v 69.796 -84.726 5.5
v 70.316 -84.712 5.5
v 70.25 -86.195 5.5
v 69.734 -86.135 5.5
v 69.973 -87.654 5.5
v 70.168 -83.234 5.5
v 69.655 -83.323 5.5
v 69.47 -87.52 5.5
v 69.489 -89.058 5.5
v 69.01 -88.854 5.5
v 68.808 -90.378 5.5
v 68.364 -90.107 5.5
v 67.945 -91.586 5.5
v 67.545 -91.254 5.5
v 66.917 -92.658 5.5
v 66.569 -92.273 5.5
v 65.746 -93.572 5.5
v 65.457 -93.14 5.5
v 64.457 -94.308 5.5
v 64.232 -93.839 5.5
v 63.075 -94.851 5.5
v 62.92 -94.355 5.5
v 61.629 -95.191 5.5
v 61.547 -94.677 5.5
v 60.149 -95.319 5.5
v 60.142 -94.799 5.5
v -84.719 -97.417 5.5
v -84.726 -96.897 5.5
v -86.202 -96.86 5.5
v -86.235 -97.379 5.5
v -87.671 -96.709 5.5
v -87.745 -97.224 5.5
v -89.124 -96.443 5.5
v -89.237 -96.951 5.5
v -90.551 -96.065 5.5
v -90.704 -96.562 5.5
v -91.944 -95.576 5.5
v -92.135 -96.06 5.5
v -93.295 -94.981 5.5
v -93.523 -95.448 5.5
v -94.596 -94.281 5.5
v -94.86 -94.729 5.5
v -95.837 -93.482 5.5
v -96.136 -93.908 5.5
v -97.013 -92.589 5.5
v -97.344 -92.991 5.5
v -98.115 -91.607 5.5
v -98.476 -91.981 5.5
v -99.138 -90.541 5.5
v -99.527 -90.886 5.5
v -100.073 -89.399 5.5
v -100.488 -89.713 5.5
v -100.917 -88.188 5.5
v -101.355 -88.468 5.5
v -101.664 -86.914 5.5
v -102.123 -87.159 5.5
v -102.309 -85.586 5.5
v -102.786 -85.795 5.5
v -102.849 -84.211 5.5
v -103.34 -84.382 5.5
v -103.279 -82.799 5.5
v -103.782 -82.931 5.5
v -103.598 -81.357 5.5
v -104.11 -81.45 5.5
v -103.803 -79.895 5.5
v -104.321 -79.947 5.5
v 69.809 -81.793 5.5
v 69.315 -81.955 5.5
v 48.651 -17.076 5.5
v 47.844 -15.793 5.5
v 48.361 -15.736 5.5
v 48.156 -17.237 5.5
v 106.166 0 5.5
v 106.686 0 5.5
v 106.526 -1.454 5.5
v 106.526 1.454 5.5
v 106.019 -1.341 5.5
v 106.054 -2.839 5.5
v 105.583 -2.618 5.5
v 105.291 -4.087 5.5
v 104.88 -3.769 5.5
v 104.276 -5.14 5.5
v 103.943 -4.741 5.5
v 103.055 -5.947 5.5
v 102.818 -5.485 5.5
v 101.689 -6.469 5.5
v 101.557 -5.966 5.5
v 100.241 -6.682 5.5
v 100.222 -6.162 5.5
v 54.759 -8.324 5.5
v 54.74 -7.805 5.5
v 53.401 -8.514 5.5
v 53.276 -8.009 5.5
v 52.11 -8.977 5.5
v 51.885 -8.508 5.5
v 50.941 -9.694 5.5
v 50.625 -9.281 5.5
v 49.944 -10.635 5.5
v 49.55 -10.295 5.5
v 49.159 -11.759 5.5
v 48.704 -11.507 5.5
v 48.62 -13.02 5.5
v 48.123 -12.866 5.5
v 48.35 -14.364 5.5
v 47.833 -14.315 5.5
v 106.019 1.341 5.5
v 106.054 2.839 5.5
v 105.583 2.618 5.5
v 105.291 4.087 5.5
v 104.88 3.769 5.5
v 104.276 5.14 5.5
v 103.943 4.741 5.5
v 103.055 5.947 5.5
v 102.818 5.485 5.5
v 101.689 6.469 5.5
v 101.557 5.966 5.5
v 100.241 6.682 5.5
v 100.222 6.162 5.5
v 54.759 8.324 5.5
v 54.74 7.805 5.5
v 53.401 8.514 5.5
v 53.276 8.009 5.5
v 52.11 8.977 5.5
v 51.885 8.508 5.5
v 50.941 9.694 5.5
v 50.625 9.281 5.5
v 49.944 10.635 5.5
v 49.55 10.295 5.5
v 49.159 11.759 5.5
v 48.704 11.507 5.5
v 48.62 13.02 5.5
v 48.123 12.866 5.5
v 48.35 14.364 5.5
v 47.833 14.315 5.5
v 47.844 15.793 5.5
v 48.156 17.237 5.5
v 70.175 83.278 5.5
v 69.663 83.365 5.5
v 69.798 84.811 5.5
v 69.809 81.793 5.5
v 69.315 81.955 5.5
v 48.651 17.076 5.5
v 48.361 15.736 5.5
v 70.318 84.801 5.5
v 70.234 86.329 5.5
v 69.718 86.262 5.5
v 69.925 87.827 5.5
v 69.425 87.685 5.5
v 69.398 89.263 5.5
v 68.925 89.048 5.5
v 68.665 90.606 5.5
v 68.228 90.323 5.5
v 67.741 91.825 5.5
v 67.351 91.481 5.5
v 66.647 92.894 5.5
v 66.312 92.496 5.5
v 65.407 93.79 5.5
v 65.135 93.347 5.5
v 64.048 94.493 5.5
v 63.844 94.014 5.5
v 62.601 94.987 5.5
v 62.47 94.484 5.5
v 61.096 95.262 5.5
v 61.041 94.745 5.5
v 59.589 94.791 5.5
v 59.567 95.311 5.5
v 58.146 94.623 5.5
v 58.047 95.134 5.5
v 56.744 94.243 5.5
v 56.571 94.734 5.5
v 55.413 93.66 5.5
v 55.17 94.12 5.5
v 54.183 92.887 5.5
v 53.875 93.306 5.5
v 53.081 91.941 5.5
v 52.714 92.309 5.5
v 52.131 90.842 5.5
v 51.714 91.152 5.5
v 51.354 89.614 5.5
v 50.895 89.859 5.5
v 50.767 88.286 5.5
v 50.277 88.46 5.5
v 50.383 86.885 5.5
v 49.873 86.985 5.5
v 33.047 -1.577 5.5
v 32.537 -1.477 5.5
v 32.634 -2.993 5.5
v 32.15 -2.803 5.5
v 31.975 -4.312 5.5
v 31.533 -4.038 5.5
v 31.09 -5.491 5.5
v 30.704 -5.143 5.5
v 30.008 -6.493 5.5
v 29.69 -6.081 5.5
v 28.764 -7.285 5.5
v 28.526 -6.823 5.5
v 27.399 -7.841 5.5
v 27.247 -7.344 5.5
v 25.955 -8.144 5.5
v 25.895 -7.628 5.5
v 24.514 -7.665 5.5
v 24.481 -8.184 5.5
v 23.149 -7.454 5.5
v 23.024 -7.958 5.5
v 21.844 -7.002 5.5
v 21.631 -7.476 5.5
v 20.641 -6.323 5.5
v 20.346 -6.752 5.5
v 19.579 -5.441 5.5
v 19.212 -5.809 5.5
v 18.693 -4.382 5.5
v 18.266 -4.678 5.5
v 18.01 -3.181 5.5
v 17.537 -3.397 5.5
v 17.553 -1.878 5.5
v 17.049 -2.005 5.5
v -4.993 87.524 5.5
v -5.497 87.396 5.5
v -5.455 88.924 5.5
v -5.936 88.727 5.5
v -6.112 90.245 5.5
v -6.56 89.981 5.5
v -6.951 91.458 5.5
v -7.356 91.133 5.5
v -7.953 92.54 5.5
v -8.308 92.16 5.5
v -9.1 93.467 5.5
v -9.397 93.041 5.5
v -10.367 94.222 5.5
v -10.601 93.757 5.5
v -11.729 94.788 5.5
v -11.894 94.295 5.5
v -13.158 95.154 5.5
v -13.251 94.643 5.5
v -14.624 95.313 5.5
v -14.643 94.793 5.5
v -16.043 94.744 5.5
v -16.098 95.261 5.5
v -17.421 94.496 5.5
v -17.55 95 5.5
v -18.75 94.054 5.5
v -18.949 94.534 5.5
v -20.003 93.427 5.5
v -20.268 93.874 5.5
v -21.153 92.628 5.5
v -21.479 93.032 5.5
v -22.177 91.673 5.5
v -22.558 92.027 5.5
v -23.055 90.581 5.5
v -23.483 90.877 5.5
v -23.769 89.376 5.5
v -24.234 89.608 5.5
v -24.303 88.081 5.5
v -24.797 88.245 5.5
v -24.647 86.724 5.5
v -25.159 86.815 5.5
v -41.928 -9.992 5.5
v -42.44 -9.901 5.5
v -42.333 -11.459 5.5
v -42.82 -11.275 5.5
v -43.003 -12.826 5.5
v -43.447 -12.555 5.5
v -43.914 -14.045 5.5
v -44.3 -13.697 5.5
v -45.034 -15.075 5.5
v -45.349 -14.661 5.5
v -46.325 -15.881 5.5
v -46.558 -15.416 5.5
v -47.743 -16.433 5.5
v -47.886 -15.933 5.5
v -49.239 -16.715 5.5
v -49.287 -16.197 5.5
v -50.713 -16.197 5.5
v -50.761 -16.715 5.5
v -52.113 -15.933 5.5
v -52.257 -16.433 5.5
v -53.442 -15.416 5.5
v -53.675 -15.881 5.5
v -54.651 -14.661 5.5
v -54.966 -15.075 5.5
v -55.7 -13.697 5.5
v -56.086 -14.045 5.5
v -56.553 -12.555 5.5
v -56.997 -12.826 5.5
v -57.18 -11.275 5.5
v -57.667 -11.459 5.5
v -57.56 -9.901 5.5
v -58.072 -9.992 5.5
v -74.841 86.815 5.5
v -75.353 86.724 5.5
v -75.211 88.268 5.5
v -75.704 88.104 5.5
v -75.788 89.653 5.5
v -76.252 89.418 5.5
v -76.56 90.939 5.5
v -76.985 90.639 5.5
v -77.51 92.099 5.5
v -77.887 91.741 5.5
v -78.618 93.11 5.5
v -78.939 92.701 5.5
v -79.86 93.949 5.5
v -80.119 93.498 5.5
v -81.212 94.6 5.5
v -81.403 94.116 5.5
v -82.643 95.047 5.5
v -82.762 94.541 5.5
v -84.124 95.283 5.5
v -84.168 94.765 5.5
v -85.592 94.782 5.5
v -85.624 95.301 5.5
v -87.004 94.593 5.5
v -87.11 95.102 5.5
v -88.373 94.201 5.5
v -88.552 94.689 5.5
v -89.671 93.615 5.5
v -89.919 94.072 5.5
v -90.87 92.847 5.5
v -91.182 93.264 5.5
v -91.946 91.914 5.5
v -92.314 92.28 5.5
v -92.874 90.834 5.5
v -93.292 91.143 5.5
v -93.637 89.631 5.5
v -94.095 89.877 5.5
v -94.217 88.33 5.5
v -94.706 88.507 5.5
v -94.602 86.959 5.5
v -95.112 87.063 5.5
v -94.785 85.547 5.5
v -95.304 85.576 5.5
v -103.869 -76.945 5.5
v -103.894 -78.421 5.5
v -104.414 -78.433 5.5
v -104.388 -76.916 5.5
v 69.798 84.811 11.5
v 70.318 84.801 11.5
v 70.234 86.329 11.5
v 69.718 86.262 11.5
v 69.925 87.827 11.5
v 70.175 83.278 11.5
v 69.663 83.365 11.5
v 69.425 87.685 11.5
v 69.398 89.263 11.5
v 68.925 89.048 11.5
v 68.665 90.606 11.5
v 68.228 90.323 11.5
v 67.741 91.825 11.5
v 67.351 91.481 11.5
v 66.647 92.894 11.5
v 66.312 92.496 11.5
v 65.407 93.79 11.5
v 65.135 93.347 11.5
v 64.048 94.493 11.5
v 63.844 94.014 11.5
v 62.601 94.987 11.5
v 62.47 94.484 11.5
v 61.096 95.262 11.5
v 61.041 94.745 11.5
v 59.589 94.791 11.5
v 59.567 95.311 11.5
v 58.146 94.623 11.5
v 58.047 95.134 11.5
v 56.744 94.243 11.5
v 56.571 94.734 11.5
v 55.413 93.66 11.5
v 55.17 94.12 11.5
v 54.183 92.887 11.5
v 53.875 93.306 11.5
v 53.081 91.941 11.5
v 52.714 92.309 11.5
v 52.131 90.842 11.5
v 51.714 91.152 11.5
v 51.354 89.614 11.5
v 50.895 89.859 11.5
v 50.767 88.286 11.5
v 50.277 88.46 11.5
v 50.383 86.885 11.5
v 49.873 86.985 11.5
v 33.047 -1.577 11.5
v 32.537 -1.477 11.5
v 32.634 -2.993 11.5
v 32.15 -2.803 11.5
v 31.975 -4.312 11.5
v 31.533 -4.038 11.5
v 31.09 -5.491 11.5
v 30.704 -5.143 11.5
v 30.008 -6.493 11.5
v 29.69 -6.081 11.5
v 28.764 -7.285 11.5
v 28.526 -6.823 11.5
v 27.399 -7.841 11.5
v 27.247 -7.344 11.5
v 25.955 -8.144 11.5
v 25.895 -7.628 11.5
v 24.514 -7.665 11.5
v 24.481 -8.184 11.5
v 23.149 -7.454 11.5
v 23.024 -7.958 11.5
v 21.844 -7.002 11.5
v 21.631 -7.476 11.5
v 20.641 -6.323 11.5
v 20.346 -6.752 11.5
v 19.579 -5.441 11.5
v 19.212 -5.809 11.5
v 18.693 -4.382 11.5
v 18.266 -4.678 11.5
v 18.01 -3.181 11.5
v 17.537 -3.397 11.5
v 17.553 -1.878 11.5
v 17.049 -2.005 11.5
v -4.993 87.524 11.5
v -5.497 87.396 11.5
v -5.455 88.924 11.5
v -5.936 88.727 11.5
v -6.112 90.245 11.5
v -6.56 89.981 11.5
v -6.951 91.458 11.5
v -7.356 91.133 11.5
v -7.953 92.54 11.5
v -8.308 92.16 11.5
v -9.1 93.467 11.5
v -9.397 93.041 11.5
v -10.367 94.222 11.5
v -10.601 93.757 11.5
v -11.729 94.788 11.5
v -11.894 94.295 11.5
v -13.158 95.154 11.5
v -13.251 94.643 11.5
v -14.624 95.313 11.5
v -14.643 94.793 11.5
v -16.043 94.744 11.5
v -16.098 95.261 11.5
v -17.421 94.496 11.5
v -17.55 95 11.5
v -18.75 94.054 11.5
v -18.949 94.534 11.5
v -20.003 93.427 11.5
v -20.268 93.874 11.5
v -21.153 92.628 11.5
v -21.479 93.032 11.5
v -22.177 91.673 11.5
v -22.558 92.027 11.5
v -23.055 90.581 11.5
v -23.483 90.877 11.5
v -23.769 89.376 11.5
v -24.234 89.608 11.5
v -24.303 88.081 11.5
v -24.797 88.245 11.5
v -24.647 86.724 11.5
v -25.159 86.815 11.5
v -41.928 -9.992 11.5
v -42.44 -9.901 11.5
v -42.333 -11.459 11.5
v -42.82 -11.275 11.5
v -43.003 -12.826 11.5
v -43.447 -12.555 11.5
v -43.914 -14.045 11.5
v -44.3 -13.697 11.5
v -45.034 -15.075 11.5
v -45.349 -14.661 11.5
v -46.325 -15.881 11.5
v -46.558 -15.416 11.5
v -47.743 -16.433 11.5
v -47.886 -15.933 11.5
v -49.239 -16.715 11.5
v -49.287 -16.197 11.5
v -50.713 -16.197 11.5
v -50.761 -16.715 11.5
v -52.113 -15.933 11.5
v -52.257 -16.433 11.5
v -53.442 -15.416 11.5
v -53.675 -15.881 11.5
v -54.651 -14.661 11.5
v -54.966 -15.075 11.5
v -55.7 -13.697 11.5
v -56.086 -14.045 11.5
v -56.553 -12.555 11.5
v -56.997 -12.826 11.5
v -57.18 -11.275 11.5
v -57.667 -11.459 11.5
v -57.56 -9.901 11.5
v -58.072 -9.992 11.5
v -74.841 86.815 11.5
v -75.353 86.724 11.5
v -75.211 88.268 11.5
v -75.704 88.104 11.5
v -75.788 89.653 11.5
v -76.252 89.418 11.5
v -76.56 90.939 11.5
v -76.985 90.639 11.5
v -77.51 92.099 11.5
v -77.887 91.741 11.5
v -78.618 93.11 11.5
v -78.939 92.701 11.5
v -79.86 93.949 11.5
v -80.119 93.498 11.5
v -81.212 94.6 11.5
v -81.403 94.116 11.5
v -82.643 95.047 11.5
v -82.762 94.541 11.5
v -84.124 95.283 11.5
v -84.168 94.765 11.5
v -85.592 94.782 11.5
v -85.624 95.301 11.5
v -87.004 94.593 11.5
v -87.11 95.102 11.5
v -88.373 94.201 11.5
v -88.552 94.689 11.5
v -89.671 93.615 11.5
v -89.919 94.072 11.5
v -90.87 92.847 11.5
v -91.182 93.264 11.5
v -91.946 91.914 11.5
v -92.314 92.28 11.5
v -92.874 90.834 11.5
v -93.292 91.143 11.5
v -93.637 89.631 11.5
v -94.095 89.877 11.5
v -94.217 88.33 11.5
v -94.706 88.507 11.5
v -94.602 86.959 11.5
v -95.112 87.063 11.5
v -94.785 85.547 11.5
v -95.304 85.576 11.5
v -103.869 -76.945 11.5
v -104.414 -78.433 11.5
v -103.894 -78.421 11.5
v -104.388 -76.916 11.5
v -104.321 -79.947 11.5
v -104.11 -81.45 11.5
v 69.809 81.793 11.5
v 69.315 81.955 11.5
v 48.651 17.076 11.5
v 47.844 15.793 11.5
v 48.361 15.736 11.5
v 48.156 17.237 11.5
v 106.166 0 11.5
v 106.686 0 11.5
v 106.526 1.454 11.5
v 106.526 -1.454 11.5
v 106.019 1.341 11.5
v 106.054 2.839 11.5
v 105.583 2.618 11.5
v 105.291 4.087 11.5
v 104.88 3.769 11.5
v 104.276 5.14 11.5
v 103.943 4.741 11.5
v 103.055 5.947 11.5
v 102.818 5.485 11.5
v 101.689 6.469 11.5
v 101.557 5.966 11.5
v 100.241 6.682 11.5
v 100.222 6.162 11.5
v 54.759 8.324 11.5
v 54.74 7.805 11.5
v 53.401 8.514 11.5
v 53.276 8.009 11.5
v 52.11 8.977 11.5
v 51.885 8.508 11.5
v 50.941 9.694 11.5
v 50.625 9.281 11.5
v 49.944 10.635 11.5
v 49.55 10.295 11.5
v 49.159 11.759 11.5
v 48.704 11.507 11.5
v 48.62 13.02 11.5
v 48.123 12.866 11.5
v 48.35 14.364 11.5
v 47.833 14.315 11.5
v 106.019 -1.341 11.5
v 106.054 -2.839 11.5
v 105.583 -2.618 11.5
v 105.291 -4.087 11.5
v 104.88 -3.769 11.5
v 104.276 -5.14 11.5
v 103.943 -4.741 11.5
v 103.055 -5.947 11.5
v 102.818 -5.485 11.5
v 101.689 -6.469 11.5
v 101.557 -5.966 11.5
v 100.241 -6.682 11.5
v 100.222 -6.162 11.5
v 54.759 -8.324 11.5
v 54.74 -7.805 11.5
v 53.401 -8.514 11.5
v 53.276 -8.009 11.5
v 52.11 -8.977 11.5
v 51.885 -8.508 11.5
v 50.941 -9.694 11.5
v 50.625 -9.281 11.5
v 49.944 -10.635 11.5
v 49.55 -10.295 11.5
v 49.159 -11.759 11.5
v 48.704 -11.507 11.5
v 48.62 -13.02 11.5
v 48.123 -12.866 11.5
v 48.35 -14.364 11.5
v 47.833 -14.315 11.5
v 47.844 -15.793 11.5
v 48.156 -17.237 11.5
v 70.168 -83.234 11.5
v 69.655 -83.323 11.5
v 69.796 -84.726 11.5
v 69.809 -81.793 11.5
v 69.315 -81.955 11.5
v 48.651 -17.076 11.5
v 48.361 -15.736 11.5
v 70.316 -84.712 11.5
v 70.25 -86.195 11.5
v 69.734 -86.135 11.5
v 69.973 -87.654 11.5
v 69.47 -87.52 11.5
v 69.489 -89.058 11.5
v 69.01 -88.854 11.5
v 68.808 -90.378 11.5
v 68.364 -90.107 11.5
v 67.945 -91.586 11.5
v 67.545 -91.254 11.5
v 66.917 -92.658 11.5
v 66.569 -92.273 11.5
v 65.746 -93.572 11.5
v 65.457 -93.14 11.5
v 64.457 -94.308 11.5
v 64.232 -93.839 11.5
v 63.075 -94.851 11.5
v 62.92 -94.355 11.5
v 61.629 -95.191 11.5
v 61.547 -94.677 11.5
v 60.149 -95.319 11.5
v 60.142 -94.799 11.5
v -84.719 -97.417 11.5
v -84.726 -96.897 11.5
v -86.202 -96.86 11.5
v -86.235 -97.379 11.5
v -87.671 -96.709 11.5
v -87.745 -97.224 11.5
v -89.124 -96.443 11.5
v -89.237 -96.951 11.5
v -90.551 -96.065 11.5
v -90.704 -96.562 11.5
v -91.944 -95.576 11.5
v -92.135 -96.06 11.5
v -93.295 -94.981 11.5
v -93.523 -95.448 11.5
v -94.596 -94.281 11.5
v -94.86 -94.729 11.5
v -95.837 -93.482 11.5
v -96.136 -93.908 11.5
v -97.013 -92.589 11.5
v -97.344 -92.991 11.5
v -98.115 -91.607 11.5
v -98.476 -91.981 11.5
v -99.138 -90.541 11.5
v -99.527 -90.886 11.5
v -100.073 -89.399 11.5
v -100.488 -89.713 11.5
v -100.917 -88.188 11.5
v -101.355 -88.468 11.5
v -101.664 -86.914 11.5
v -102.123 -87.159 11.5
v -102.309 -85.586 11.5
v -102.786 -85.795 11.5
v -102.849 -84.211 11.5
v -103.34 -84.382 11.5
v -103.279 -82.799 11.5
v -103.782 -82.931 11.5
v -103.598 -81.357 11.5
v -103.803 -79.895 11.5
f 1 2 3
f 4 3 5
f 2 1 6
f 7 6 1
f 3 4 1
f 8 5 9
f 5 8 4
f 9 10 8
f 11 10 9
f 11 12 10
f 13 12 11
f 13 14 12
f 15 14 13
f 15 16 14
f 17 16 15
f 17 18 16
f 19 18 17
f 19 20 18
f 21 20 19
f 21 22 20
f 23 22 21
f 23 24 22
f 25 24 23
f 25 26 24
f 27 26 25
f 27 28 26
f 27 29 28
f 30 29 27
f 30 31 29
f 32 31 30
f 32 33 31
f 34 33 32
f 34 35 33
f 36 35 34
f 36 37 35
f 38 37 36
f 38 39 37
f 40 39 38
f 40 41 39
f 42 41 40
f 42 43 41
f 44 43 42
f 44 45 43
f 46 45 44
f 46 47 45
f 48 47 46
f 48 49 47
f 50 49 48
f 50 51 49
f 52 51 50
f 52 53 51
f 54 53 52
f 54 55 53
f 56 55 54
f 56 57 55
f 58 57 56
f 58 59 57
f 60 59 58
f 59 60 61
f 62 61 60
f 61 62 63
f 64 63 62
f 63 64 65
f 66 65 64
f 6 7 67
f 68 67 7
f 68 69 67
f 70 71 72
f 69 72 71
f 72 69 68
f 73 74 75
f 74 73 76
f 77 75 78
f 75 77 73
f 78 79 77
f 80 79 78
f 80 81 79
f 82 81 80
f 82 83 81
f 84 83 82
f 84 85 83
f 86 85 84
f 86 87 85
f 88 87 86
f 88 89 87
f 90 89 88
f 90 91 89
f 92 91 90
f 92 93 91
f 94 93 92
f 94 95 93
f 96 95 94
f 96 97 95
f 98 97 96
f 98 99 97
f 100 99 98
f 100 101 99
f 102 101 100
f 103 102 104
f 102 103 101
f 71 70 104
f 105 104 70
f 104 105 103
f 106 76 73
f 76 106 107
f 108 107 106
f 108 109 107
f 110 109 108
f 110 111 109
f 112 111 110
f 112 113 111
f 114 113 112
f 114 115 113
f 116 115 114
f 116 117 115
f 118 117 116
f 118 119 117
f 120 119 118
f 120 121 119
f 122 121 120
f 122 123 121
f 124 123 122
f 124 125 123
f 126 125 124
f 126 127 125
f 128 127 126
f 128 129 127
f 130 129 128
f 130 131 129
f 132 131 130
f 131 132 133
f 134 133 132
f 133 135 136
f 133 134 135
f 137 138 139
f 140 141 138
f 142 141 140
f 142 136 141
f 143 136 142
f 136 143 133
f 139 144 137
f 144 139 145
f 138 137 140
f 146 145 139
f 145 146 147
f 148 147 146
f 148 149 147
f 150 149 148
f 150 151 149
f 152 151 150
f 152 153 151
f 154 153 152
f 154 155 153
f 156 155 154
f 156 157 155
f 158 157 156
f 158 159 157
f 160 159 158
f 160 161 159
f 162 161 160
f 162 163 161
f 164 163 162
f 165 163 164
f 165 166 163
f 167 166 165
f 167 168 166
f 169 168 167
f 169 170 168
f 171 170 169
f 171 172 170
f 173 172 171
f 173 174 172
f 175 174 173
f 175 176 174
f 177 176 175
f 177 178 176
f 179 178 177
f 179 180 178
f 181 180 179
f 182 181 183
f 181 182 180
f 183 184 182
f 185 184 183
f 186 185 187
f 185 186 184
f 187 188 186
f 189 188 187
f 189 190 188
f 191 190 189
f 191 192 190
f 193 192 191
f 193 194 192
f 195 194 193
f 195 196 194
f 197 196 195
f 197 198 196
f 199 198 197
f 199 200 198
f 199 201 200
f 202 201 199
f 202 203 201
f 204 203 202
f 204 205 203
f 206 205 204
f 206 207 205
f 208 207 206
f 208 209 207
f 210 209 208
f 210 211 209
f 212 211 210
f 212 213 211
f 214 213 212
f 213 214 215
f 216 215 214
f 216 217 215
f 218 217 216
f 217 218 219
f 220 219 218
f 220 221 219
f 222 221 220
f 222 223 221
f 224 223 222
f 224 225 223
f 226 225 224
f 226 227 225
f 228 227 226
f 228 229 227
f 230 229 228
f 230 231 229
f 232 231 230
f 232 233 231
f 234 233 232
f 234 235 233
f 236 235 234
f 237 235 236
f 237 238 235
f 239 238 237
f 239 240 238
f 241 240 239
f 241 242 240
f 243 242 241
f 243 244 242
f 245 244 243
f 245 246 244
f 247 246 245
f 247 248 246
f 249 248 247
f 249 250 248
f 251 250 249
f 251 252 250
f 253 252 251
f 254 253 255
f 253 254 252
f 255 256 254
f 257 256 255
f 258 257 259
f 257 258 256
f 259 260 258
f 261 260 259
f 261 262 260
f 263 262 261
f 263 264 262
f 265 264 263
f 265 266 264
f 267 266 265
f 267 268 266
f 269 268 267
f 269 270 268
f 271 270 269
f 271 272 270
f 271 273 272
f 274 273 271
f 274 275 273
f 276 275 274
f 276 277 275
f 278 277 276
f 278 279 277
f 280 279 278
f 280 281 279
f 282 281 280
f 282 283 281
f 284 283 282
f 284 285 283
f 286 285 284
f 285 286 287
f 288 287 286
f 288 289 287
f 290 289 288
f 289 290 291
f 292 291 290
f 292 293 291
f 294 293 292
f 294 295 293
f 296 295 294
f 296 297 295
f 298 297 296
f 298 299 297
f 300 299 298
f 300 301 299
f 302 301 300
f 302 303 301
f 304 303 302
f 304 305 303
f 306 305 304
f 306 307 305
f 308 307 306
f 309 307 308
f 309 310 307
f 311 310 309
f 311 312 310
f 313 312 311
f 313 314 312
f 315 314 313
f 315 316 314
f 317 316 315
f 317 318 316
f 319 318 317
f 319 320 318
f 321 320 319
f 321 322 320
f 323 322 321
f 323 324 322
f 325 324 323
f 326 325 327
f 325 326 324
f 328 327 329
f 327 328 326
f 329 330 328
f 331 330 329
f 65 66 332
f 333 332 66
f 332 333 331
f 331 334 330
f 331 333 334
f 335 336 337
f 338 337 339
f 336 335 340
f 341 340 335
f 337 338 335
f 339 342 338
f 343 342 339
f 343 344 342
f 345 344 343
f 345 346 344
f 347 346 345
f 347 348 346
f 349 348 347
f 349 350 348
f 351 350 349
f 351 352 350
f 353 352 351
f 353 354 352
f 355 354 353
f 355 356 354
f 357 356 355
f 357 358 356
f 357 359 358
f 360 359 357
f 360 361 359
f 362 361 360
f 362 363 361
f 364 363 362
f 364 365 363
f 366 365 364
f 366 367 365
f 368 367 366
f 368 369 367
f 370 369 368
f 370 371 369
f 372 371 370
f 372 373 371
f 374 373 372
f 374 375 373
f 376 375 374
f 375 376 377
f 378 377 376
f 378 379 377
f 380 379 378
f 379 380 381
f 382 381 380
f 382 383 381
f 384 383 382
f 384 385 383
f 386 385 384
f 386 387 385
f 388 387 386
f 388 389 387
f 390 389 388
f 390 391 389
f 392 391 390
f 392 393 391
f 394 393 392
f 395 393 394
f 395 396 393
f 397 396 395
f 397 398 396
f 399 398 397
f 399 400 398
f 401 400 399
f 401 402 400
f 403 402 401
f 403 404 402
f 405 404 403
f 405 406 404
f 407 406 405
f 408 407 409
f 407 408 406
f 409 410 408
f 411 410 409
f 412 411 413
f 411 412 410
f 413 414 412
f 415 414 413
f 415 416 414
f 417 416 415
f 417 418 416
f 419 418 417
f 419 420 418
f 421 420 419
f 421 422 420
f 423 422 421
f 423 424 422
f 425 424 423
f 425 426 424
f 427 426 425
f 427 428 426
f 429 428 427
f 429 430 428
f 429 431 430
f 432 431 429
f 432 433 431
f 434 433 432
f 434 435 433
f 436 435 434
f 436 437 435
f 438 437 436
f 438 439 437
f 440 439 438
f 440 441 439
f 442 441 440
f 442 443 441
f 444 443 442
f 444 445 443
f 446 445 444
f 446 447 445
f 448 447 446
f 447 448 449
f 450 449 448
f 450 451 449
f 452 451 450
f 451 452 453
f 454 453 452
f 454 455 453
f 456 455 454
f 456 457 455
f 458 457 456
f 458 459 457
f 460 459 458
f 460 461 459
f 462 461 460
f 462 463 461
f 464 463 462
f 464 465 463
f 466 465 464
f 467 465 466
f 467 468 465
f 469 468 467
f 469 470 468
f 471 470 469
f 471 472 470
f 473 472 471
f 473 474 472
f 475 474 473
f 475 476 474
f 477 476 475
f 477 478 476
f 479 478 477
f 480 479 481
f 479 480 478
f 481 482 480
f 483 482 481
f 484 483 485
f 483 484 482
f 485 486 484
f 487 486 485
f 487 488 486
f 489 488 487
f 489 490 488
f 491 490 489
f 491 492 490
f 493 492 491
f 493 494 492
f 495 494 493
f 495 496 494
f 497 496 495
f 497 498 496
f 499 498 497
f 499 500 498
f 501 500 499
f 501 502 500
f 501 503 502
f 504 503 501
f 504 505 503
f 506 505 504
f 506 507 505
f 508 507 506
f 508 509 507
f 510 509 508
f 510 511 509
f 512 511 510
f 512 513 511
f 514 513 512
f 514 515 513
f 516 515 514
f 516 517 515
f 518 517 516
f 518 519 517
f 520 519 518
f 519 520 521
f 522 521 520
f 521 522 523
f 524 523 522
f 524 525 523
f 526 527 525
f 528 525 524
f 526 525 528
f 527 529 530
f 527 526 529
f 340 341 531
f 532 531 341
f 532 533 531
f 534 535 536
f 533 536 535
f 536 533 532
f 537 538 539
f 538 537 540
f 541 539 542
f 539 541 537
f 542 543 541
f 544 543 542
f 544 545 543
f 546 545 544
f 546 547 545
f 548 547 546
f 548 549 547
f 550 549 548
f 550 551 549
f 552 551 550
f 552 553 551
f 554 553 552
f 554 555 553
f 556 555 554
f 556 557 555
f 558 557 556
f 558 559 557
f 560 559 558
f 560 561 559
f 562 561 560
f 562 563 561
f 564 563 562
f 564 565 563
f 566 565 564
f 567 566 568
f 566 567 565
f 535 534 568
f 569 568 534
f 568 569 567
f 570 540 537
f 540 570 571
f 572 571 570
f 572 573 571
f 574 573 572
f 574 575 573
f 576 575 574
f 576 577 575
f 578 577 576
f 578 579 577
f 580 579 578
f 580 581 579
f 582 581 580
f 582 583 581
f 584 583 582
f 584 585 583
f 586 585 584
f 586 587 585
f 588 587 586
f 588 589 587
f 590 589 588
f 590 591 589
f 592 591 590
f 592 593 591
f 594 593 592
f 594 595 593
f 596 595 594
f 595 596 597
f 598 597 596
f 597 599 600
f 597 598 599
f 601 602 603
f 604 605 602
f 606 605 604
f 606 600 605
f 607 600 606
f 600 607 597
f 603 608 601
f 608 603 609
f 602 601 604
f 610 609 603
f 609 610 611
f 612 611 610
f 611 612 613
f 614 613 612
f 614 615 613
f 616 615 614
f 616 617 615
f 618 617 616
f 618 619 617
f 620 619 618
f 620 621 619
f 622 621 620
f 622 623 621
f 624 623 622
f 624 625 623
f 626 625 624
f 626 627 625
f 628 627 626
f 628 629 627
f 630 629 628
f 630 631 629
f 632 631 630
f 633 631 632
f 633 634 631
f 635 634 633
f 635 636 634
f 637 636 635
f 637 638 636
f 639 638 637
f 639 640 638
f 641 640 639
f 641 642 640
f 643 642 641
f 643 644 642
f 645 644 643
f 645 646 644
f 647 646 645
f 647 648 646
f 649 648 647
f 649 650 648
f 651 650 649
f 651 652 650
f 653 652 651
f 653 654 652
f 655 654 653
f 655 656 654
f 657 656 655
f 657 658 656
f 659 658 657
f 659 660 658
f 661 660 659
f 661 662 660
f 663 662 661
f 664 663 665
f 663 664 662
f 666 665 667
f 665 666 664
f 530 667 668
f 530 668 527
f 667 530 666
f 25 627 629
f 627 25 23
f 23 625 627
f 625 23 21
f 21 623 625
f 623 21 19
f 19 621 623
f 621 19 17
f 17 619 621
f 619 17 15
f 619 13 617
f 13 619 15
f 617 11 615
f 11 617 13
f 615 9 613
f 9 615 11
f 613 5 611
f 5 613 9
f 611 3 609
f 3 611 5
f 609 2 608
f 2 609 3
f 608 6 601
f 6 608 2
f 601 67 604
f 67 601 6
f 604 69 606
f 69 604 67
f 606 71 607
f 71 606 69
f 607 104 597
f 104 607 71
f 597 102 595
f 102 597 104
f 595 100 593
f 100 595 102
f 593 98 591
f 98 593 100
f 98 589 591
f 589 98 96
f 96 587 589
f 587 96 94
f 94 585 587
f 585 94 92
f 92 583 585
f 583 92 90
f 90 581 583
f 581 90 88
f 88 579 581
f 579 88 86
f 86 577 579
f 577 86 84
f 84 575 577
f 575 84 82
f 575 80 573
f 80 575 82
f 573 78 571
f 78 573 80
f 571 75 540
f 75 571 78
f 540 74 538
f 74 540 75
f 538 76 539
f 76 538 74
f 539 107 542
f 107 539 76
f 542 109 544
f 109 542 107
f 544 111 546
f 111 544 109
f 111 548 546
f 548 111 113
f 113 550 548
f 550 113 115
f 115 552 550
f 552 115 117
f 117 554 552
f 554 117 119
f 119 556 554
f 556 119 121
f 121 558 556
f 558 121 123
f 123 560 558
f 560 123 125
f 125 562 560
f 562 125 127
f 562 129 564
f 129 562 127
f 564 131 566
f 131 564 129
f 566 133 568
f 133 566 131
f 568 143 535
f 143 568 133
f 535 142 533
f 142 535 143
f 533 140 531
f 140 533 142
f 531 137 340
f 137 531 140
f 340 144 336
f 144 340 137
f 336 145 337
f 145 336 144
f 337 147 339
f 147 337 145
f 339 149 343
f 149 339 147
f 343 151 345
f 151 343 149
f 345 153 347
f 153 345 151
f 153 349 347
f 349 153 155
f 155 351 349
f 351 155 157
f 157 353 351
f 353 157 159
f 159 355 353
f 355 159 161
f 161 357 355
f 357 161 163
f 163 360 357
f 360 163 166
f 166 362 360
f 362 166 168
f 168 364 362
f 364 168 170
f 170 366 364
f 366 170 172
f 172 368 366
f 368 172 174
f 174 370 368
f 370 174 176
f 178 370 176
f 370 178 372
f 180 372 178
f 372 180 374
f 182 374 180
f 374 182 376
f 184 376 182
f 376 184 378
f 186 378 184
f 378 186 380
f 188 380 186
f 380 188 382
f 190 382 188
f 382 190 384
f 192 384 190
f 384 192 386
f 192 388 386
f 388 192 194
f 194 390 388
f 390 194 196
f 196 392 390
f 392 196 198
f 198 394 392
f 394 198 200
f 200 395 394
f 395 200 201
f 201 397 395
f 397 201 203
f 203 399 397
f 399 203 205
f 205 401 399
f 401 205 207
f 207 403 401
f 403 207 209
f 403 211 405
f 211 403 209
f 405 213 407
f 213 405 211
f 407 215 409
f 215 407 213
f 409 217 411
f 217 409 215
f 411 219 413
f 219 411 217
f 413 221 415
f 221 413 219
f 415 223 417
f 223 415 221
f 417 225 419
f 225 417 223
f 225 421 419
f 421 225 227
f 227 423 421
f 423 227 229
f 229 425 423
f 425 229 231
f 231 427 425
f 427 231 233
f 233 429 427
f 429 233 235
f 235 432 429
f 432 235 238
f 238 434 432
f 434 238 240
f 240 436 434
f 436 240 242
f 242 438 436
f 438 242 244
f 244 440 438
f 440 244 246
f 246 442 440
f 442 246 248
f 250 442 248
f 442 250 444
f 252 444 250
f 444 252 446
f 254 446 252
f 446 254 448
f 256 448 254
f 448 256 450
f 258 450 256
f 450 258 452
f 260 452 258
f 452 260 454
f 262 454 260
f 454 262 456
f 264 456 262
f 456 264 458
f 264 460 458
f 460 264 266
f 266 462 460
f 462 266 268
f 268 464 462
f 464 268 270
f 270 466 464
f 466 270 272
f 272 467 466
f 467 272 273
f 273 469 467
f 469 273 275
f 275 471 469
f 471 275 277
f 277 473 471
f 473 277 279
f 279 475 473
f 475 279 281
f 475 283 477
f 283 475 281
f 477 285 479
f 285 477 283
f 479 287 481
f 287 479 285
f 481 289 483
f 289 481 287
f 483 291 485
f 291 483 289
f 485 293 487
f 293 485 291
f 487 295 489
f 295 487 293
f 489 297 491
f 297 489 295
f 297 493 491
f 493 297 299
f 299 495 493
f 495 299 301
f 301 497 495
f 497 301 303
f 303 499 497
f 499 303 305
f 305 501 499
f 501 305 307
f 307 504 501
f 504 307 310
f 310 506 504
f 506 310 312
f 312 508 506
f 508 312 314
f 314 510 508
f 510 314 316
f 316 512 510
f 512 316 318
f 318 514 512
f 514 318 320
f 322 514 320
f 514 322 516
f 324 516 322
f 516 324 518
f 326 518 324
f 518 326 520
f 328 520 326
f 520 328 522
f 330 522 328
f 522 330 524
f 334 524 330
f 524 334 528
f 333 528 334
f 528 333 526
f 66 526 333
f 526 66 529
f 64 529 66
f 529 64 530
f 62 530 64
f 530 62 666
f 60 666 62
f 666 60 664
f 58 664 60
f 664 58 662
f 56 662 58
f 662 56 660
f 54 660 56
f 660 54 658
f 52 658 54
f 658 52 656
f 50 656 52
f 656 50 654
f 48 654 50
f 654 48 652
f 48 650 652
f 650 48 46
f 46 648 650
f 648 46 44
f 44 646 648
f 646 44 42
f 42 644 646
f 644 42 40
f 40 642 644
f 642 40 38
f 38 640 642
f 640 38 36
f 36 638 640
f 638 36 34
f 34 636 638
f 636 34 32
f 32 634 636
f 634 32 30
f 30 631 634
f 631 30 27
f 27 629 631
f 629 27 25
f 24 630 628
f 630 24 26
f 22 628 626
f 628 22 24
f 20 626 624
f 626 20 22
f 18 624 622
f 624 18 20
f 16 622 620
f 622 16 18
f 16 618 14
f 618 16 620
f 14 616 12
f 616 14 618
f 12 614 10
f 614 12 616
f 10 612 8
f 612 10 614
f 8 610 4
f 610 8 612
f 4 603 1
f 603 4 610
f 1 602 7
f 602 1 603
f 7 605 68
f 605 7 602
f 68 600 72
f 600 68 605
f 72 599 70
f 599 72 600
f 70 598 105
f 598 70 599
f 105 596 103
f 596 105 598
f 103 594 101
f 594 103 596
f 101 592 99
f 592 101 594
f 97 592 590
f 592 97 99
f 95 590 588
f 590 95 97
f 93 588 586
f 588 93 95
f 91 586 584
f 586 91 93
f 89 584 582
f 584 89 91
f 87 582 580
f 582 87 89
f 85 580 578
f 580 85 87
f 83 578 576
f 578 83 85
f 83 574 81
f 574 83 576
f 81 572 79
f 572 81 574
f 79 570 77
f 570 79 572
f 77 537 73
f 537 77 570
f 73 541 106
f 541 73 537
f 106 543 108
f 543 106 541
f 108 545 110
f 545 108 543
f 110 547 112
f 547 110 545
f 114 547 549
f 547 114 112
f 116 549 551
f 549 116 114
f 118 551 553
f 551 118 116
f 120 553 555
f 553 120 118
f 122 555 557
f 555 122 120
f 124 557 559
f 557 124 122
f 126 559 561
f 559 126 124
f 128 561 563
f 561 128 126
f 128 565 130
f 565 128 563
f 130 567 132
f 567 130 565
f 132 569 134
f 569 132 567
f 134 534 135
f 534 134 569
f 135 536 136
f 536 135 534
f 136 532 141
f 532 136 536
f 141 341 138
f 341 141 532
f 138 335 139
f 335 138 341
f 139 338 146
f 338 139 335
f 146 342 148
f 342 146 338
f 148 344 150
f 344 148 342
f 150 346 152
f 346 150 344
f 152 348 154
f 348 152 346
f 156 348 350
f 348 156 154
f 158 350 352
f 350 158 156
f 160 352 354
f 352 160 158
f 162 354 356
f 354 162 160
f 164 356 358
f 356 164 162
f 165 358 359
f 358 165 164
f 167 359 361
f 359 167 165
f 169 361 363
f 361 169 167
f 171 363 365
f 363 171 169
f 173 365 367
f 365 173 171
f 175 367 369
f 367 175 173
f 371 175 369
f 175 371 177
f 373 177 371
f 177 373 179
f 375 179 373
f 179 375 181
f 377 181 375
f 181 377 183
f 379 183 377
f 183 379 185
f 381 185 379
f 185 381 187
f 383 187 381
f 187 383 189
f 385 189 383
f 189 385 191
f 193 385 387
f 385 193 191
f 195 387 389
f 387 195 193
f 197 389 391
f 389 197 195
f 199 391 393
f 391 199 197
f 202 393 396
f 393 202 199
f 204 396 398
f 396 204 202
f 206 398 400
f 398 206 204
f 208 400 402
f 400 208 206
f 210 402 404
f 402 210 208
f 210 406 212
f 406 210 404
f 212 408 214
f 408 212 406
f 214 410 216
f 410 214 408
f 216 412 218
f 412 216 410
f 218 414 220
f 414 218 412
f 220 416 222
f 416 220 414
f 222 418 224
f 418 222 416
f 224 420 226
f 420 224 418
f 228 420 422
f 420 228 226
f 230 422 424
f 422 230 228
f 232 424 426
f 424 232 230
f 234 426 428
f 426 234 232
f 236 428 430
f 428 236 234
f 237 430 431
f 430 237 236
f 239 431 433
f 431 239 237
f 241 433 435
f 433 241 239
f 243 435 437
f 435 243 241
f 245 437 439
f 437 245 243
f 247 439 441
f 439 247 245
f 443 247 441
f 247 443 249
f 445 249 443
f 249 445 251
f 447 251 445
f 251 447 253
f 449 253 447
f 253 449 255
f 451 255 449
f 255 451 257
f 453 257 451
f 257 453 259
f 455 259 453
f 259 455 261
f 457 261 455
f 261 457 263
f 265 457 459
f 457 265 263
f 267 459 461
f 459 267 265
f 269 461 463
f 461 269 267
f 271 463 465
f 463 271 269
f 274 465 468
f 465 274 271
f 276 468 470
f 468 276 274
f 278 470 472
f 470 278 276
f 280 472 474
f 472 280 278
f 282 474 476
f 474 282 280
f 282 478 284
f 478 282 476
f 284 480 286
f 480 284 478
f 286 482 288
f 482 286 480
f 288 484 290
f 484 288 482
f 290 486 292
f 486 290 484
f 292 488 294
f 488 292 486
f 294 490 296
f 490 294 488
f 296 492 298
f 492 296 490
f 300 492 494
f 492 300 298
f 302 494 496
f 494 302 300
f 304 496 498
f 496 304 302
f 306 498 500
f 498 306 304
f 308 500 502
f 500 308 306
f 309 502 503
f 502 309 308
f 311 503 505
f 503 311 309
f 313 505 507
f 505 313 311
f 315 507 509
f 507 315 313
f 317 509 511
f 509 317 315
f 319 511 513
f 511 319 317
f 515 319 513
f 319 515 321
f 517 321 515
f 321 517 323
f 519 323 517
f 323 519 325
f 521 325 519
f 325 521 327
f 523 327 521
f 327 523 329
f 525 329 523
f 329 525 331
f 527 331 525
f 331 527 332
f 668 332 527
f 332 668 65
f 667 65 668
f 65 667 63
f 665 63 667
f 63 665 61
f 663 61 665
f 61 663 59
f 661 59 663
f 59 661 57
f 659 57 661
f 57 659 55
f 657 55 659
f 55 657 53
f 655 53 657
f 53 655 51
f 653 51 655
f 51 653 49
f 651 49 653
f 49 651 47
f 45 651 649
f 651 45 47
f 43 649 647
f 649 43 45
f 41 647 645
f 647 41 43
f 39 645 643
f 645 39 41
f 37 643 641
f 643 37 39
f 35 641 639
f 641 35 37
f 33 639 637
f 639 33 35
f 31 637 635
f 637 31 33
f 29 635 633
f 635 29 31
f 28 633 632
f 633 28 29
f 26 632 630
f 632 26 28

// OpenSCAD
difference() {
  translate([0, 0, 5.5]) {
    linear_extrude(height = 6) {
      polygon(points = [[-104.3883, -76.9161], [-104.4138, -78.433], [-104.3207, -79.9473], [-104.1097, -81.4497], [-103.7821, -82.9311], [-103.3398, -84.3823], [-102.7856, -85.7946], [-102.1228, -87.1593], [-101.3554, -88.4681], [-100.4883, -89.713], [-99.5266, -90.8864], [-98.4762, -91.9812], [-97.3436, -92.9906], [-96.1356, -93.9085], [-94.8596, -94.7293], [-93.5235, -95.448], [-92.1354, -96.0601], [-90.7036, -96.5621], [-89.2371, -96.9507], [-87.7447, -97.2236], [-86.2355, -97.3792], [-84.7189, -97.4166], [60.1494, -95.3189], [61.6289, -95.1906], [63.0746, -94.8513], [64.4567, -94.3081], [65.7465, -93.572], [66.9173, -92.6585], [67.9449, -91.5864], [68.808, -90.3779], [69.4887, -89.0581], [69.9729, -87.6542], [70.2505, -86.1953], [70.316, -84.7117], [70.1678, -83.2341], [69.8091, -81.7931], [48.6507, -17.0758], [48.3606, -15.7356], [48.3503, -14.3645], [48.6202, -13.0201], [49.1588, -11.7591], [49.9436, -10.6347], [50.9415, -9.6943], [52.1103, -8.9774], [53.4009, -8.5142], [54.7589, -8.3244], [100.2413, -6.6818], [101.6888, -6.4694], [103.0554, -5.9473], [104.2757, -5.1404], [105.2913, -4.0874], [106.0537, -2.8387], [106.5261, -1.4542], [106.6862, 0], [106.5261, 1.4542], [106.0537, 2.8387], [105.2913, 4.0874], [104.2757, 5.1404], [103.0554, 5.9473], [101.6888, 6.4694], [100.2413, 6.6818], [54.7589, 8.3244], [53.4009, 8.5142], [52.1103, 8.9774], [50.9415, 9.6943], [49.9436, 10.6347], [49.1588, 11.7591], [48.6202, 13.0201], [48.3503, 14.3645], [48.3606, 15.7356], [48.6507, 17.0758], [69.8091, 81.7931], [70.1754, 83.2783], [70.3181, 84.8014], [70.2341, 86.3288], [69.9252, 87.827], [69.3983, 89.2631], [68.6649, 90.6056], [67.741, 91.8249], [66.6471, 92.8942], [65.4072, 93.79], [64.0484, 94.4928], [62.6007, 94.9869], [61.0958, 95.2617], [59.5669, 95.3109], [58.0474, 95.1336], [56.5709, 94.7336], [55.1697, 94.1198], [53.8747, 93.3056], [52.7142, 92.3089], [51.7139, 91.1516], [50.8955, 89.8592], [50.2773, 88.4599], [49.8726, 86.9847], [32.5366, -1.477], [32.1503, -2.8029], [31.5327, -4.0382], [30.7038, -5.1428], [29.6905, -6.0812], [28.5256, -6.823], [27.2466, -7.3441], [25.895, -7.6277], [24.5144, -7.6646], [23.1495, -7.4537], [21.8445, -7.0018], [20.6415, -6.3235], [19.5795, -5.4406], [18.6927, -4.3818], [18.0099, -3.1814], [17.5532, -1.878], [-4.9933, 87.5236], [-5.4553, 88.9243], [-6.1122, 90.2449], [-6.9506, 91.4583], [-7.9534, 92.5398], [-9.1002, 93.4673], [-10.3675, 94.2218], [-11.7294, 94.788], [-13.1581, 95.1543], [-14.6244, 95.3132], [-16.0984, 95.2614], [-17.55, 95], [-18.9494, 94.5344], [-20.2682, 93.874], [-21.4795, 93.0324], [-22.5583, 92.0267], [-23.4828, 90.8775], [-24.234, 89.6082], [-24.7966, 88.2448], [-25.1591, 86.8152], [-42.4397, -9.9008], [-42.8196, -11.2747], [-43.4468, -12.5547], [-44.2997, -13.6967], [-45.3489, -14.6615], [-46.5584, -15.4157], [-47.8865, -15.9335], [-49.2873, -16.1969], [-50.7127, -16.1969], [-52.1135, -15.9335], [-53.4416, -15.4157], [-54.6511, -14.6615], [-55.7003, -13.6967], [-56.5532, -12.5547], [-57.1804, -11.2747], [-57.5603, -9.9008], [-74.8409, 86.8152], [-75.2112, 88.2684], [-75.7883, 89.6526], [-76.5599, 90.9386], [-77.5097, 92.0992], [-78.6177, 93.1098], [-79.8605, 93.9492], [-81.2118, 94.5996], [-82.6431, 95.0473], [-84.1242, 95.2828], [-85.6238, 95.3011], [-87.1102, 95.102], [-88.552, 94.6895], [-89.9188, 94.0723], [-91.1818, 93.2636], [-92.3142, 92.2804], [-93.2922, 91.1435], [-94.095, 89.8768], [-94.7058, 88.5071], [-95.1116, 87.0634], [-95.3039, 85.5761]]);
    }
  }
  translate([0, 0, 4.5]) {
    linear_extrude(height = 8) {
      polygon(points = [[-103.8691, -76.9451], [-103.8939, -78.4214], [-103.8033, -79.8952], [-103.598, -81.3573], [-103.2791, -82.799], [-102.8487, -84.2114], [-102.3093, -85.5859], [-101.6642, -86.914], [-100.9175, -88.1878], [-100.0735, -89.3994], [-99.1376, -90.5414], [-98.1153, -91.6068], [-97.013, -92.5892], [-95.8374, -93.4825], [-94.5956, -94.2813], [-93.2953, -94.9807], [-91.9443, -95.5765], [-90.5509, -96.065], [-89.1236, -96.4432], [-87.6712, -96.7089], [-86.2025, -96.8603], [-84.7264, -96.8966], [60.1419, -94.799], [61.5468, -94.6772], [62.9197, -94.355], [64.2322, -93.839], [65.457, -93.1401], [66.5688, -92.2726], [67.5446, -91.2545], [68.3642, -90.1069], [69.0105, -88.8536], [69.4703, -87.5204], [69.734, -86.1351], [69.7962, -84.7263], [69.6555, -83.3231], [69.3148, -81.9547], [48.1565, -17.2374], [47.8438, -15.7929], [47.8327, -14.315], [48.1235, -12.866], [48.7041, -11.5069], [49.55, -10.2949], [50.6255, -9.2813], [51.8854, -8.5085], [53.2765, -8.0093], [54.7402, -7.8047], [100.2225, -6.1622], [101.5574, -5.9663], [102.8178, -5.4847], [103.9432, -4.7406], [104.8798, -3.7695], [105.5828, -2.618], [106.0186, -1.3411], [106.1662, 0], [106.0186, 1.3411], [105.5828, 2.618], [104.8798, 3.7695], [103.9432, 4.7406], [102.8178, 5.4847], [101.5574, 5.9663], [100.2225, 6.1622], [54.7402, 7.8047], [53.2765, 8.0093], [51.8854, 8.5085], [50.6255, 9.2813], [49.55, 10.2949], [48.7041, 11.5069], [48.1235, 12.866], [47.8327, 14.315], [47.8438, 15.7929], [48.1565, 17.2374], [69.3148, 81.9547], [69.6627, 83.3651], [69.7982, 84.8114], [69.7184, 86.2618], [69.4251, 87.6846], [68.9247, 89.0483], [68.2283, 90.3231], [67.351, 91.481], [66.3122, 92.4964], [65.1347, 93.3471], [63.8444, 94.0145], [62.4696, 94.4837], [61.0406, 94.7446], [59.5887, 94.7914], [58.1458, 94.623], [56.7437, 94.2432], [55.4131, 93.6603], [54.1833, 92.8871], [53.0814, 91.9406], [52.1314, 90.8416], [51.3543, 89.6143], [50.7672, 88.2856], [50.3829, 86.8847], [33.0469, -1.577], [32.6344, -2.9927], [31.975, -4.3116], [31.09, -5.4911], [30.0081, -6.493], [28.7643, -7.2849], [27.3987, -7.8413], [25.9555, -8.1441], [24.4815, -8.1836], [23.0242, -7.9584], [21.6308, -7.4759], [20.3464, -6.7516], [19.2125, -5.809], [18.2657, -4.6785], [17.5366, -3.3968], [17.049, -2.0052], [-5.4975, 87.3965], [-5.9362, 88.7266], [-6.56, 89.9806], [-7.3562, 91.1329], [-8.3085, 92.1599], [-9.3975, 93.0406], [-10.6009, 93.7572], [-11.8942, 94.2948], [-13.2509, 94.6426], [-14.6433, 94.7935], [-16.0431, 94.7443], [-17.4215, 94.4961], [-18.7504, 94.054], [-20.0028, 93.4269], [-21.153, 92.6276], [-22.1775, 91.6726], [-23.0554, 90.5813], [-23.7687, 89.376], [-24.303, 88.0813], [-24.6472, 86.7237], [-41.9278, -9.9923], [-42.3334, -11.4592], [-43.003, -12.8258], [-43.9137, -14.0452], [-45.034, -15.0753], [-46.3254, -15.8806], [-47.7434, -16.4334], [-49.239, -16.7146], [-50.761, -16.7146], [-52.2566, -16.4334], [-53.6746, -15.8806], [-54.966, -15.0753], [-56.0863, -14.0452], [-56.997, -12.8258], [-57.6666, -11.4592], [-58.0722, -9.9923], [-75.3528, 86.7237], [-75.7045, 88.1037], [-76.2525, 89.4182], [-76.9852, 90.6394], [-77.8871, 91.7414], [-78.9393, 92.7012], [-80.1195, 93.4983], [-81.4027, 94.1159], [-82.7619, 94.541], [-84.1683, 94.7646], [-85.5923, 94.7821], [-87.0038, 94.5929], [-88.373, 94.2012], [-89.671, 93.6152], [-90.8703, 92.8473], [-91.9457, 91.9136], [-92.8744, 90.8339], [-93.6367, 89.6311], [-94.2168, 88.3304], [-94.6021, 86.9594], [-94.7847, 85.547]]);
    }
  }
}
$fn = 50;
